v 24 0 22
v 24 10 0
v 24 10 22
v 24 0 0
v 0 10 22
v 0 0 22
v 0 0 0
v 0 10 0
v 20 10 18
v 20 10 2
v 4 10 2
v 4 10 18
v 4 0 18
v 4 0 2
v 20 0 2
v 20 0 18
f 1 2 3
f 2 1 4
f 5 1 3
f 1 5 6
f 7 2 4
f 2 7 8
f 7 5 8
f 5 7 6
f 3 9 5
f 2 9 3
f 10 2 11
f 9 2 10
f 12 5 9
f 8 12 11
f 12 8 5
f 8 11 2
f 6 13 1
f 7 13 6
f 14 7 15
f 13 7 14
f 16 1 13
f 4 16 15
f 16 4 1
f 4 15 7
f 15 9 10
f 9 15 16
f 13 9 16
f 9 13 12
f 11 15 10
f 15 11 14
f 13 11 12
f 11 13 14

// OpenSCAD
difference()
{
    cube([24,10,22]);
    
    translate([4,-1,2])
    cube([16,12,16]);
}
